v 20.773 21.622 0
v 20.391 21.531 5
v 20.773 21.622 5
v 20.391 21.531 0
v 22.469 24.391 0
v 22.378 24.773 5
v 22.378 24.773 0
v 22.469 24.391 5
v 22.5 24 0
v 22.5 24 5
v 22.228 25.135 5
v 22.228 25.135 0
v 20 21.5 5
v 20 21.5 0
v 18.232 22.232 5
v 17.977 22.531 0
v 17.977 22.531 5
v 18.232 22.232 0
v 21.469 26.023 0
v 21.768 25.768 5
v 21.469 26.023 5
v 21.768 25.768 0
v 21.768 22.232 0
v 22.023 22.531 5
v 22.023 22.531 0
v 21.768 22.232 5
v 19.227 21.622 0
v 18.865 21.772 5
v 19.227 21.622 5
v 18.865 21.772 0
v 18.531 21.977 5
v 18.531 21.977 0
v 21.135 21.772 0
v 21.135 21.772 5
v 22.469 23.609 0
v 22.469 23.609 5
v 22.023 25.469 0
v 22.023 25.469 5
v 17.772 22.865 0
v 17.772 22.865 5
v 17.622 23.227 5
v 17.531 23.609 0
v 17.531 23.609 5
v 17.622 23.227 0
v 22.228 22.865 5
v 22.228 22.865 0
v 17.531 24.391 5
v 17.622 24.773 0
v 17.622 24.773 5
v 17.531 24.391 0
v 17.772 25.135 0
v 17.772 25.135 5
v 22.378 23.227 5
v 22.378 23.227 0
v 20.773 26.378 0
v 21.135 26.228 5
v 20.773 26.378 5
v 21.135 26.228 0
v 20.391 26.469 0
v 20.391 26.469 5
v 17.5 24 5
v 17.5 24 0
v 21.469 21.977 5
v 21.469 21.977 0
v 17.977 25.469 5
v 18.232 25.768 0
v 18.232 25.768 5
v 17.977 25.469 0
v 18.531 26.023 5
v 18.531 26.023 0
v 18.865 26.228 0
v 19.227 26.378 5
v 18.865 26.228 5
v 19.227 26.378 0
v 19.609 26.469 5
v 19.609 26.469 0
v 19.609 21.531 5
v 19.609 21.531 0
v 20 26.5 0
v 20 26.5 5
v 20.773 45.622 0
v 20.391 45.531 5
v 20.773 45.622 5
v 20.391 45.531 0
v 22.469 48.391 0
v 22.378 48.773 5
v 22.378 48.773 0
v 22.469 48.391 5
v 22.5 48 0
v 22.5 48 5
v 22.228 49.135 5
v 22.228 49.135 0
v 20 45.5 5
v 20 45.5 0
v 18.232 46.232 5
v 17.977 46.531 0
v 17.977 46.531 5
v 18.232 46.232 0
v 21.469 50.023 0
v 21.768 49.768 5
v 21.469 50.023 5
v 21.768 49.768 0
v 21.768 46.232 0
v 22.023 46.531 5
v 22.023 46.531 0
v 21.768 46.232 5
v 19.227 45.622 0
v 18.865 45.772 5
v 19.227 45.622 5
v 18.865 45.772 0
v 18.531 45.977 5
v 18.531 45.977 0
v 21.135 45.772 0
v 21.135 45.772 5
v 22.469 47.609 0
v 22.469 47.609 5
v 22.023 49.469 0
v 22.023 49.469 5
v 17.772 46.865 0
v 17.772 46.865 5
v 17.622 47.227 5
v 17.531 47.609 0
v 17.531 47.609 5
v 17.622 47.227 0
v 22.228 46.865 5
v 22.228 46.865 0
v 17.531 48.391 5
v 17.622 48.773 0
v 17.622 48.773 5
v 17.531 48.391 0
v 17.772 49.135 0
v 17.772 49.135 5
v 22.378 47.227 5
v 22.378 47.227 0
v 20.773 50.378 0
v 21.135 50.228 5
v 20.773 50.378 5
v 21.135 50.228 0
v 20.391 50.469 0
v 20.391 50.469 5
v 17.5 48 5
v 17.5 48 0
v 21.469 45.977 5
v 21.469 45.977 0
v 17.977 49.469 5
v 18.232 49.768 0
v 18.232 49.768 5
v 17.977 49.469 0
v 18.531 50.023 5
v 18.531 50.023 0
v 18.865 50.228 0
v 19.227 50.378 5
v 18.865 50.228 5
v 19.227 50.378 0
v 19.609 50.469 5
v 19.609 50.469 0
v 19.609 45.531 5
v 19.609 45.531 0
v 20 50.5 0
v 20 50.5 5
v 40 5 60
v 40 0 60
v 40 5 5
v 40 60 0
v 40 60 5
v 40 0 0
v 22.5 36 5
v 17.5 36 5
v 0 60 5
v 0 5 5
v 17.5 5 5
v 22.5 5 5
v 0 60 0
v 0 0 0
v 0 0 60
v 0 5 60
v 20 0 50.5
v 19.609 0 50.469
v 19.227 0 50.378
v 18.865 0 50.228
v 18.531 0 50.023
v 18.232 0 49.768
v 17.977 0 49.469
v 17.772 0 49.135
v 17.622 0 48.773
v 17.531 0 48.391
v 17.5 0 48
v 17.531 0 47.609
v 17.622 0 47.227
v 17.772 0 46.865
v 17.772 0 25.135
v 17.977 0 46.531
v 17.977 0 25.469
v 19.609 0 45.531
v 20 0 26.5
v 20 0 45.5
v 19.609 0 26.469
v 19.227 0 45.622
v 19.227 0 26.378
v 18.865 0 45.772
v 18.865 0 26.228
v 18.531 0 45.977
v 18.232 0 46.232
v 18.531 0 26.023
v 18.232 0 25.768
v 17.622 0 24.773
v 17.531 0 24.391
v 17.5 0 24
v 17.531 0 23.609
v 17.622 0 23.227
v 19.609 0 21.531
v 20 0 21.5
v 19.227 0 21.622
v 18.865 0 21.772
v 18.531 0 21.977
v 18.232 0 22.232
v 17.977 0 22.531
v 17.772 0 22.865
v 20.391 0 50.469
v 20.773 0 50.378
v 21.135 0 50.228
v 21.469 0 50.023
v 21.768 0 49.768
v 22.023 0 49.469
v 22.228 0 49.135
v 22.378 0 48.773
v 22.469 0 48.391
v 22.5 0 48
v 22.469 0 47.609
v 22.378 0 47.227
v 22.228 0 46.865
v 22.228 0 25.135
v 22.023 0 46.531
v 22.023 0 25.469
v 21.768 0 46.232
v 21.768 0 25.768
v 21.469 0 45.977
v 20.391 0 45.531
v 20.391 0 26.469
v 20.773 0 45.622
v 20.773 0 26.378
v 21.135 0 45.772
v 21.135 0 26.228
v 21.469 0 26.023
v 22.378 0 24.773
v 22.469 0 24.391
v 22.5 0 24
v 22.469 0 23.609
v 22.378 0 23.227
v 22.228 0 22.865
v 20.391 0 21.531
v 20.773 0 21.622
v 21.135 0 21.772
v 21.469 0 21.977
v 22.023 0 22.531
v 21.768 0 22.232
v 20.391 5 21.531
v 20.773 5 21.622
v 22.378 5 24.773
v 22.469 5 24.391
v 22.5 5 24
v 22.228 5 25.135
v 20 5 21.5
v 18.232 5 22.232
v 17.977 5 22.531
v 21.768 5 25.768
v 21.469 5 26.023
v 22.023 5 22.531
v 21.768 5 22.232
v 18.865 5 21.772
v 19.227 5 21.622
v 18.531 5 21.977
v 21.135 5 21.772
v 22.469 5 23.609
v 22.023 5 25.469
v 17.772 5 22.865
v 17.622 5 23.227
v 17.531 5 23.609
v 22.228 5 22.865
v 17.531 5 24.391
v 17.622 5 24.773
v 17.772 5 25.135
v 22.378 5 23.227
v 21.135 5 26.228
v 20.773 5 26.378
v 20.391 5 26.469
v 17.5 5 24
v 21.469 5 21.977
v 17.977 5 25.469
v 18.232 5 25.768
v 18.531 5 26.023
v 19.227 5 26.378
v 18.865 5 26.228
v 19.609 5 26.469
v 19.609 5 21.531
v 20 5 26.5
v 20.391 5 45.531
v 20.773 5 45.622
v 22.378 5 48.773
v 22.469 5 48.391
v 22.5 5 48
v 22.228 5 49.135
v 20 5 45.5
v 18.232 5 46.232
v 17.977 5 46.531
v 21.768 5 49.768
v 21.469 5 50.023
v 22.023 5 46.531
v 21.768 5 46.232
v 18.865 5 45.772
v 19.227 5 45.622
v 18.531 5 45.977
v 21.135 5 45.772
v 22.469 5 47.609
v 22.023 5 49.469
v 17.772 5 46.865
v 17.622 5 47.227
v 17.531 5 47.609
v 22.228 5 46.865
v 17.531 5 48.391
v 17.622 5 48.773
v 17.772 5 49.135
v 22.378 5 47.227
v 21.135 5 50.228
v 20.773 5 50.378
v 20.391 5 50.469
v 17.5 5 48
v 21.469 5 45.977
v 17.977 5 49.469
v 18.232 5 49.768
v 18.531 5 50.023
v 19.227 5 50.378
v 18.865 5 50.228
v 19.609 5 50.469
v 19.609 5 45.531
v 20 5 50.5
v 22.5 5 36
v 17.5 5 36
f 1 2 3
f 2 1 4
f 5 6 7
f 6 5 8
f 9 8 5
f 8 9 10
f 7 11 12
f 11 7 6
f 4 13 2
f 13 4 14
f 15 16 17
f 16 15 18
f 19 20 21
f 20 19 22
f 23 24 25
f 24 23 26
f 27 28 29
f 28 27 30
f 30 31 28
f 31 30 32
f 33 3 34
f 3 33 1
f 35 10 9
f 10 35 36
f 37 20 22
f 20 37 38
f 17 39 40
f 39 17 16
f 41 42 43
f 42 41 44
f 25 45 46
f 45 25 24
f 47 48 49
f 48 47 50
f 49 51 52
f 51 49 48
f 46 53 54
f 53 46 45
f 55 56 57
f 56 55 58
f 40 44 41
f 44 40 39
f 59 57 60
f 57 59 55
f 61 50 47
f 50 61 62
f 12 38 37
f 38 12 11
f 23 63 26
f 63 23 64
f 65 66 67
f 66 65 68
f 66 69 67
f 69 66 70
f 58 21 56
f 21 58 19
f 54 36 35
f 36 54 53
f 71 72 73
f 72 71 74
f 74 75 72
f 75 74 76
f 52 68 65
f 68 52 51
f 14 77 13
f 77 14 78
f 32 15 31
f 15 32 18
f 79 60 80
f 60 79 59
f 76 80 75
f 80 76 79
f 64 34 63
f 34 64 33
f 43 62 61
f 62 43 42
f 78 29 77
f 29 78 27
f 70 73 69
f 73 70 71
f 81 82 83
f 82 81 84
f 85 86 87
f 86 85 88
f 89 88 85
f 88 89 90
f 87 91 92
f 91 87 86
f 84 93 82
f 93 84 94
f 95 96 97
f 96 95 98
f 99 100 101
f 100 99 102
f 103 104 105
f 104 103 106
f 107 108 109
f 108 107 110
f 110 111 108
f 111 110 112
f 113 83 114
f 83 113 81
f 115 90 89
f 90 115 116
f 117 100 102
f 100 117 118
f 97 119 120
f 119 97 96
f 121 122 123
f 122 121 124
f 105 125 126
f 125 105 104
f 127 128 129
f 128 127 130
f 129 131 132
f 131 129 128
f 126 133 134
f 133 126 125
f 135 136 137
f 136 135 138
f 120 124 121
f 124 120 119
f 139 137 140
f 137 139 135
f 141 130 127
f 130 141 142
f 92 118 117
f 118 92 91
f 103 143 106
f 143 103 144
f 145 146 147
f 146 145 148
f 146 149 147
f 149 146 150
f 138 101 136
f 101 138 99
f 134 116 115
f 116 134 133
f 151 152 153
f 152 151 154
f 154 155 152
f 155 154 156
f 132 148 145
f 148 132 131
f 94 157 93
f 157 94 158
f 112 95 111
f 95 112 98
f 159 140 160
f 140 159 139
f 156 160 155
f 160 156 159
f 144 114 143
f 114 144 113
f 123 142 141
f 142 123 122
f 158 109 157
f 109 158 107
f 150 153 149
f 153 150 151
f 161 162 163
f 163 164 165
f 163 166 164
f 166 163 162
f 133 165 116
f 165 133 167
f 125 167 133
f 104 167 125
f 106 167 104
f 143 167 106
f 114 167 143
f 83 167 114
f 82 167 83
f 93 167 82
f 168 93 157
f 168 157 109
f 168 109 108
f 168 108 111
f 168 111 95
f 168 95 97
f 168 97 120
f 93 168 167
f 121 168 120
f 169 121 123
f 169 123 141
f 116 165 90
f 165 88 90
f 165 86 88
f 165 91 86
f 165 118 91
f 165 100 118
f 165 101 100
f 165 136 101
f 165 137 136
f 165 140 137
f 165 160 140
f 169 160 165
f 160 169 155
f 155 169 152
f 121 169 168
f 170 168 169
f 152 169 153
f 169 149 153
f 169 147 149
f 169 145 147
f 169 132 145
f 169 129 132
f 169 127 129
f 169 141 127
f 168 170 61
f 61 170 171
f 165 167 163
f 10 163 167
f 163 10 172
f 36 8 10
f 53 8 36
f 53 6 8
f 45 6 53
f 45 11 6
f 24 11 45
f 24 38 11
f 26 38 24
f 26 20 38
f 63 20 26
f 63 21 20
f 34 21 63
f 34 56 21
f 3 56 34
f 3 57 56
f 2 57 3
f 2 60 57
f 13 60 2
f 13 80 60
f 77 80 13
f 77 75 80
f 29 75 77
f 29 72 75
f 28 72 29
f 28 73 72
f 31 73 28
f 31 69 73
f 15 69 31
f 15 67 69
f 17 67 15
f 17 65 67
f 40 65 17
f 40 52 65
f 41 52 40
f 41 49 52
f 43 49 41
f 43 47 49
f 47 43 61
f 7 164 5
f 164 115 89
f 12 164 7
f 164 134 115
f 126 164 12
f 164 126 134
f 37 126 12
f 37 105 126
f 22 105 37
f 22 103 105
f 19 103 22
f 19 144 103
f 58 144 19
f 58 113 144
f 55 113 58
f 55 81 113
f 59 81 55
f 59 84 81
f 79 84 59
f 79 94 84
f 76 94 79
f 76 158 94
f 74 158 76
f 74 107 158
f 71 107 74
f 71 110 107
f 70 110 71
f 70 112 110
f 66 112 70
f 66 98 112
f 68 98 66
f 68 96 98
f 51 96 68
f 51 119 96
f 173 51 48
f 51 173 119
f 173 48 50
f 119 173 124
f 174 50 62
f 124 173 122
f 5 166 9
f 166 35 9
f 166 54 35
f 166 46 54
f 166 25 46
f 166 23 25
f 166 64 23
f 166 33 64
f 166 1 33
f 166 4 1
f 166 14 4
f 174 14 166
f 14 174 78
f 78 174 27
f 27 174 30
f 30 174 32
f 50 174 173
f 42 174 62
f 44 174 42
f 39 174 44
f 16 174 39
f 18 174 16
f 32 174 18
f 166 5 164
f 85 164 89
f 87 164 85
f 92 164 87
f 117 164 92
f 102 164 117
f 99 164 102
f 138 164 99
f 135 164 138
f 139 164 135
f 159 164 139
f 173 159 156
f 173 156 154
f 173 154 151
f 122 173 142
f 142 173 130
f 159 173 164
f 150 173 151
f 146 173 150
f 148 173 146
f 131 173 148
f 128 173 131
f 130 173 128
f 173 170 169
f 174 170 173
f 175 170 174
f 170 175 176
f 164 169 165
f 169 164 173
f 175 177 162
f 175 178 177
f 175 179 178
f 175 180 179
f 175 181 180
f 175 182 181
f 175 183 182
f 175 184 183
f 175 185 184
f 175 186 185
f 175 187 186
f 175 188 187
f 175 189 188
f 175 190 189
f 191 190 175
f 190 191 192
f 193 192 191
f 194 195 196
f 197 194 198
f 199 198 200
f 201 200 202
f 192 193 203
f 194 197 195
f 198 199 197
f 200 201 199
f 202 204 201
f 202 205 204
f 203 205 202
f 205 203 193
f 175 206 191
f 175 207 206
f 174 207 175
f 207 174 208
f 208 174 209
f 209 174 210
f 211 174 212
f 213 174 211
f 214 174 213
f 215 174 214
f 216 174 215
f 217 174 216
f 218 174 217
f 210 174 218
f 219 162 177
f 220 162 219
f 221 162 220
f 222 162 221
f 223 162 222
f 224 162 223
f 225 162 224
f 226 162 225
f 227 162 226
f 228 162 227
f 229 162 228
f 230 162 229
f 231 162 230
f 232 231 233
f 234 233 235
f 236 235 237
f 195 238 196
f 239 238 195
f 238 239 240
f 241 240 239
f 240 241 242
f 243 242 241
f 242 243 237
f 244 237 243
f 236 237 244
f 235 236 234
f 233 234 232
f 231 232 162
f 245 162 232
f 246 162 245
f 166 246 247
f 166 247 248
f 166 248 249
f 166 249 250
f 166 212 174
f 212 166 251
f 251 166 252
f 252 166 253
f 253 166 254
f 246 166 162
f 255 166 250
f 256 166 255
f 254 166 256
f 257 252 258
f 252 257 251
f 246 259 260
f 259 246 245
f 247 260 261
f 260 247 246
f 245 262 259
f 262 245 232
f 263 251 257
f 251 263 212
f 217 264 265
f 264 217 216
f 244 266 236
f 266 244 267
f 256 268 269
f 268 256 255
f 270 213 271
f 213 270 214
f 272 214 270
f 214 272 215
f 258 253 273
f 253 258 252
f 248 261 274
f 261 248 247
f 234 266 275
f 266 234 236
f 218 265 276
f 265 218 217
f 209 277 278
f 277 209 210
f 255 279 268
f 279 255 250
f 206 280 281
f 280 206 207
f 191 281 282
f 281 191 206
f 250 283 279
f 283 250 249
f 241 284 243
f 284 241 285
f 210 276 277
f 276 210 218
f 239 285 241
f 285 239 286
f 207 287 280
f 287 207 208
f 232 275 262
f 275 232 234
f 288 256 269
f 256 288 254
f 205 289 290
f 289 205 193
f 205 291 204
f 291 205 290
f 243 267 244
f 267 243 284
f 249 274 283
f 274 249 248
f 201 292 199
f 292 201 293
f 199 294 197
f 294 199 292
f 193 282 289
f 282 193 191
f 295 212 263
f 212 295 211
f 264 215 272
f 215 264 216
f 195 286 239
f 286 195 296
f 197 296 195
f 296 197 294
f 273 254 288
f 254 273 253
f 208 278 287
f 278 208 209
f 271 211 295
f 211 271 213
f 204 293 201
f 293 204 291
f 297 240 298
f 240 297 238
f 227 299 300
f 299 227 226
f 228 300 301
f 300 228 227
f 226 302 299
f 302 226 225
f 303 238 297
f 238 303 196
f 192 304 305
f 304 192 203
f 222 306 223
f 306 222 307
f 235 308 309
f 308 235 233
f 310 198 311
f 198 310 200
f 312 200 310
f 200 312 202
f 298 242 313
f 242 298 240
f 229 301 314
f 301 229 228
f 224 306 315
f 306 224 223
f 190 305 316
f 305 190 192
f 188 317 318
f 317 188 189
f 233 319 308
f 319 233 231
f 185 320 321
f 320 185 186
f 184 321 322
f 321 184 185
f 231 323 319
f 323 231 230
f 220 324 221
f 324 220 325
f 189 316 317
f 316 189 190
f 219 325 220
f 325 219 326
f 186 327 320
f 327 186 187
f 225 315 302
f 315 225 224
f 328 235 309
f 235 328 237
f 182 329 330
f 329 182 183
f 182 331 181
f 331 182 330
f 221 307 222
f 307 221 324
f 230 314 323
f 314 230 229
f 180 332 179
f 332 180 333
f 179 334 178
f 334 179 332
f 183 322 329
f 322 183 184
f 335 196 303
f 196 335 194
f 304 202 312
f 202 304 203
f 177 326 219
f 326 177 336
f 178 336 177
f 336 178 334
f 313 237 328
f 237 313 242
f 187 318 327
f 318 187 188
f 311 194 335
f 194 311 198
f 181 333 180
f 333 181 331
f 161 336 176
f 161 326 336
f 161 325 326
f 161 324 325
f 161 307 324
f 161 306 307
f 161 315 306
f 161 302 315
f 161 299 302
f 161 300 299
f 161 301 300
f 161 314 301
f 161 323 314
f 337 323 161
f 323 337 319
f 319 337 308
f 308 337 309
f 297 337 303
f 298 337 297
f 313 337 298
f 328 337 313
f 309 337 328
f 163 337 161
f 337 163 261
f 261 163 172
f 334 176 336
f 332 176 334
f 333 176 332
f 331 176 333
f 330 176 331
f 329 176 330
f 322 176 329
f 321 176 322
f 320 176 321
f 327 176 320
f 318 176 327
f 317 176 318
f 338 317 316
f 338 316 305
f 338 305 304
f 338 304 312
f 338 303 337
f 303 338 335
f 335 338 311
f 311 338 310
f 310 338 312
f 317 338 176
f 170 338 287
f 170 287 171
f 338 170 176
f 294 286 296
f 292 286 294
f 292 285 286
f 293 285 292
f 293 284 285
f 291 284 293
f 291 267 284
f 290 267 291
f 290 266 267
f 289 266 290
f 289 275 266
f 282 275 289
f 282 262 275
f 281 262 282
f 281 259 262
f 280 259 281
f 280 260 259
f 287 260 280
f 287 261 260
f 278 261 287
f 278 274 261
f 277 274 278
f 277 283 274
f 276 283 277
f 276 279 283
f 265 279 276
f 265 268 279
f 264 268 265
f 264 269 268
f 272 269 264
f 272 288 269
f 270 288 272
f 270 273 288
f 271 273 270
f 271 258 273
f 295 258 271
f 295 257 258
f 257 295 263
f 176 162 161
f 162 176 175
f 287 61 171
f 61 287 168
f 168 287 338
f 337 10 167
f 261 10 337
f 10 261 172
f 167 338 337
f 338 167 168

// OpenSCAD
// Shelf bracket
// @param width = 40 // min: 20, max: 70, step: 2, label: Width
width = 40;
// @param leg = 60 // min: 30, max: 90, step: 2, label: Leg length
leg = 60;
// @param thickness = 5 // min: 3, max: 10, step: 0.5, label: Thickness
thickness = 5;
// @param hole_d = 5 // min: 3, max: 8, step: 0.5, label: Hole diameter
hole_d = 5;

$fn = 40;
module plate(len) {
  difference() {
    cube([width, len, thickness]);
    for (y = [len * 0.4, len * 0.8])
      translate([width / 2, y, -1]) cylinder(h = thickness + 2, d = hole_d);
  }
}
plate(leg);
translate([0, thickness, 0]) rotate([90, 0, 0]) plate(leg);
// gusset
translate([width / 2 - thickness / 2, 0, 0]) rotate([90, 0, 90])
  linear_extrude(thickness) polygon([[thickness, thickness], [leg * 0.6, thickness], [thickness, leg * 0.6]]);
